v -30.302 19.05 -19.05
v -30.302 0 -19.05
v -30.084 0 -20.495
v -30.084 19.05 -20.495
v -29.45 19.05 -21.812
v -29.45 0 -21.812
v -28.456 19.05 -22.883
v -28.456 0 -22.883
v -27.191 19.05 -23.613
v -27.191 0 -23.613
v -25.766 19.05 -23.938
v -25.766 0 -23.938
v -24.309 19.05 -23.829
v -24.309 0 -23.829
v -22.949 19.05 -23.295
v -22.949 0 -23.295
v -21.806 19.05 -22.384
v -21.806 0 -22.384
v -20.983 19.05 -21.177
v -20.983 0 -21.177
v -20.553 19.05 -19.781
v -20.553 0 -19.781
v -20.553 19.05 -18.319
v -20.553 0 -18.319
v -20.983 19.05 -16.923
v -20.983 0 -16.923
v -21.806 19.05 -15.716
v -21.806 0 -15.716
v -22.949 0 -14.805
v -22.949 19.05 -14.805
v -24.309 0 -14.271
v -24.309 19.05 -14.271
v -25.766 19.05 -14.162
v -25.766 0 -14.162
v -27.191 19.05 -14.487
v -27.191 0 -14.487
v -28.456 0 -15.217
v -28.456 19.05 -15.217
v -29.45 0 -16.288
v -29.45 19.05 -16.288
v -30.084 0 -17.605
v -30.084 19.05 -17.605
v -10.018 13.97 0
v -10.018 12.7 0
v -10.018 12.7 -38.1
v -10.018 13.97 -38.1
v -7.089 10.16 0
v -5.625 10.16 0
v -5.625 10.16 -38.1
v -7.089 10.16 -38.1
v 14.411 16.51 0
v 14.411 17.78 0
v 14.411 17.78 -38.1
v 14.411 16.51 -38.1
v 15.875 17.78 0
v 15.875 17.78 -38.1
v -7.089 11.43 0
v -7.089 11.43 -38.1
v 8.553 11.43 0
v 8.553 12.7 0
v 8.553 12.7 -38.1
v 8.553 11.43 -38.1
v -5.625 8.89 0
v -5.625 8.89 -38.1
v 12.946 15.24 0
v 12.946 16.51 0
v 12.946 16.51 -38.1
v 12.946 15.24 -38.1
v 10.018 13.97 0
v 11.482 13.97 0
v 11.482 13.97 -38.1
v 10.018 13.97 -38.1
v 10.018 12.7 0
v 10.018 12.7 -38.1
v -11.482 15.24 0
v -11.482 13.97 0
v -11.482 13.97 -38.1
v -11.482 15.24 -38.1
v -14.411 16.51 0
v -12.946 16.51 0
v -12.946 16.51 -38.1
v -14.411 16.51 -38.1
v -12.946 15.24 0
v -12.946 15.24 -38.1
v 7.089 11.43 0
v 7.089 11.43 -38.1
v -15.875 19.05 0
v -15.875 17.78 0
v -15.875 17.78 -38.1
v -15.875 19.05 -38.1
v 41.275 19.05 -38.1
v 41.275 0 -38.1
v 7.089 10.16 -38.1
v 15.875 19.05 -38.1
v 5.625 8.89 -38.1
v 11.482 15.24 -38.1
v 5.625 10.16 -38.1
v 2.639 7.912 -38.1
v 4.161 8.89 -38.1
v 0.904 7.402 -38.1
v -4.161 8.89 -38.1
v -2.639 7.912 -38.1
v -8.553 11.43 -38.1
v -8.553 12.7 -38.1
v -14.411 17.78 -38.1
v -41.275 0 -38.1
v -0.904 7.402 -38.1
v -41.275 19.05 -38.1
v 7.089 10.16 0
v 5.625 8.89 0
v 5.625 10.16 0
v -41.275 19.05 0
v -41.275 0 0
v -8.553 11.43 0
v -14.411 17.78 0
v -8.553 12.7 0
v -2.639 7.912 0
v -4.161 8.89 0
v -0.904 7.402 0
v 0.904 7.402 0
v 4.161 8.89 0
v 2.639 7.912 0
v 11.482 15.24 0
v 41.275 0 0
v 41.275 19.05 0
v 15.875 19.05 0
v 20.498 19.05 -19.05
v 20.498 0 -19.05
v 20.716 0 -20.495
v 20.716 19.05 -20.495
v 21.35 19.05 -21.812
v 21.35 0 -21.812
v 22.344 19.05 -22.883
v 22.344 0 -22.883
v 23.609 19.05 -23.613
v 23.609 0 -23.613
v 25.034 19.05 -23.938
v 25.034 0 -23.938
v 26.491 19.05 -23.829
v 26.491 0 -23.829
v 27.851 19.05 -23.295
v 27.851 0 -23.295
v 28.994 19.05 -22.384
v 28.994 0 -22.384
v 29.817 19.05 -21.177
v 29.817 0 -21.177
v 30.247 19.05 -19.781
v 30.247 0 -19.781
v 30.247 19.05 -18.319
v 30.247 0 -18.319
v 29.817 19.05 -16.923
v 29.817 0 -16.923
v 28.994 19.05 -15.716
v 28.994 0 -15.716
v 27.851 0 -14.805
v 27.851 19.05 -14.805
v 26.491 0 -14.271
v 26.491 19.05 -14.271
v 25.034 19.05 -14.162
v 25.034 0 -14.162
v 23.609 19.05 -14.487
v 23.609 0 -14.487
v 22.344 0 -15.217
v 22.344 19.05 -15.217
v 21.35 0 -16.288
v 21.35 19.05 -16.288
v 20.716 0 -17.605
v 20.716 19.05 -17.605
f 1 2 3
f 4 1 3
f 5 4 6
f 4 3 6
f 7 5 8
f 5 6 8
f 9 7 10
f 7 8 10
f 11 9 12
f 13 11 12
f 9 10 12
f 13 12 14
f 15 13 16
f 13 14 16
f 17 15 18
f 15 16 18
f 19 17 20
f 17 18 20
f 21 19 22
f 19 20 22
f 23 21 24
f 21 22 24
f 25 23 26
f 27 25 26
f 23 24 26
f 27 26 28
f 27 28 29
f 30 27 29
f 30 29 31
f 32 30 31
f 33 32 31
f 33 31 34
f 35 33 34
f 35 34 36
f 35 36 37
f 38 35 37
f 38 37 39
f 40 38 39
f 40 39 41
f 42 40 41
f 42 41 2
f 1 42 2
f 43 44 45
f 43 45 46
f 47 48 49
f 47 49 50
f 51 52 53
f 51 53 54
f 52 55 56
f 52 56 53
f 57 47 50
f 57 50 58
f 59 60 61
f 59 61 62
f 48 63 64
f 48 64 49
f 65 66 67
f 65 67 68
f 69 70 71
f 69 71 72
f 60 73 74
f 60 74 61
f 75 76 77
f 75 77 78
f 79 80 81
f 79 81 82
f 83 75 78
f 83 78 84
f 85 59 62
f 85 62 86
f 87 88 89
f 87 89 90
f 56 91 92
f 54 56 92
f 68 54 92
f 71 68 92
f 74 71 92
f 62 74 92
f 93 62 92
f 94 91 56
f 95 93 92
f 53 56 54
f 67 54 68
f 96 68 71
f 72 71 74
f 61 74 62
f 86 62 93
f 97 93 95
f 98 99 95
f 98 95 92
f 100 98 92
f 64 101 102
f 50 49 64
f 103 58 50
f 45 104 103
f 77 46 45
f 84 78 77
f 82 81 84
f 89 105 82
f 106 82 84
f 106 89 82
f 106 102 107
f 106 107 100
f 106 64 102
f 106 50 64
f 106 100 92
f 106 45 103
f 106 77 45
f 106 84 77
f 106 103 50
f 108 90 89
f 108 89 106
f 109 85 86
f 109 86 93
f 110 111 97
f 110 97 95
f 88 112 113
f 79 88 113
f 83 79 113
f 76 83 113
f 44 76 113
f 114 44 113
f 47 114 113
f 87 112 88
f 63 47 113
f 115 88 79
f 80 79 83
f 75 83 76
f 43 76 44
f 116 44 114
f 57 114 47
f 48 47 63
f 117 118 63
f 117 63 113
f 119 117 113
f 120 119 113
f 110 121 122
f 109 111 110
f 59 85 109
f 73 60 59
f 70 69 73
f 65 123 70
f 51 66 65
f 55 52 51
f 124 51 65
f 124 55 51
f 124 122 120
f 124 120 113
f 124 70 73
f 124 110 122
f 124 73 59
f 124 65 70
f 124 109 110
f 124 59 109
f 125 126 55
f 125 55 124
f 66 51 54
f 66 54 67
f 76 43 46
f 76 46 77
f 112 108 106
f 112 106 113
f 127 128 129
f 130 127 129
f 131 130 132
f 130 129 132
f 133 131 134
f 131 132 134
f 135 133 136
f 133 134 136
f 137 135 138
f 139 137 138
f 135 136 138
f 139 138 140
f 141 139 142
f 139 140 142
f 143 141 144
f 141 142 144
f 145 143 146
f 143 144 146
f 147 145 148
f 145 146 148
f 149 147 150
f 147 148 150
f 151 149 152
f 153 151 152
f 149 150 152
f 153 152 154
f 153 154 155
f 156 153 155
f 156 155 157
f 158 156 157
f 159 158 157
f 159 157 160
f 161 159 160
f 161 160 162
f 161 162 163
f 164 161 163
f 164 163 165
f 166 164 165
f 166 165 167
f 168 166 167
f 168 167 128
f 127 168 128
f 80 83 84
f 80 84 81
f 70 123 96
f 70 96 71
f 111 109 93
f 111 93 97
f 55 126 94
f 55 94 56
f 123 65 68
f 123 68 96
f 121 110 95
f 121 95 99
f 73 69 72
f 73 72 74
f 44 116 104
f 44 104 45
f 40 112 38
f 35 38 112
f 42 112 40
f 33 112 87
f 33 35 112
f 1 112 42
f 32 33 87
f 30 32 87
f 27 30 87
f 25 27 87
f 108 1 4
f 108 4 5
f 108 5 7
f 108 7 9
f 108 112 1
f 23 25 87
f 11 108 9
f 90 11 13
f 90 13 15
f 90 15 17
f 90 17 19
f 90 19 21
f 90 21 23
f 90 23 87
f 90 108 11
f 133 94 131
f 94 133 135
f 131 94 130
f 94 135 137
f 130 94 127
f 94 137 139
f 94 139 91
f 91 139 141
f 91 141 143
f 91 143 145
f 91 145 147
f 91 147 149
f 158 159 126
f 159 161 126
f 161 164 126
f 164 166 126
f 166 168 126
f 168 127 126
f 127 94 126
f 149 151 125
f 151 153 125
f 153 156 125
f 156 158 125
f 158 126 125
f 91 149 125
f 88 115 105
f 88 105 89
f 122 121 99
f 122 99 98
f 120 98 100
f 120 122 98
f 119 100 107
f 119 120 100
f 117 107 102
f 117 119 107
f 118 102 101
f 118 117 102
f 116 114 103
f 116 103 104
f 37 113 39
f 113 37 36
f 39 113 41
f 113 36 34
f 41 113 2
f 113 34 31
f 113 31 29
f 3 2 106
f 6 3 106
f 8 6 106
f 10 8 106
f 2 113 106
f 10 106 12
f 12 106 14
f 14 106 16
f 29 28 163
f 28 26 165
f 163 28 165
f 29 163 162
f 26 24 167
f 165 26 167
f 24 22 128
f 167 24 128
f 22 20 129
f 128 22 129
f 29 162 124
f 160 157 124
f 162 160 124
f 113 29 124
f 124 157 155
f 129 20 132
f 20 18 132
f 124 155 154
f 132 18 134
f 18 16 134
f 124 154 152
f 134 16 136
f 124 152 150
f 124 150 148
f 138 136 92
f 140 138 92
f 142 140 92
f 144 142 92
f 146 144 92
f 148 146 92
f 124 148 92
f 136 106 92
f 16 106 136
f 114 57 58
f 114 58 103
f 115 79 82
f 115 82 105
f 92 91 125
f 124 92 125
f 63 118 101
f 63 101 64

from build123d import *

# Parameters (mm, degrees)
SKETCH1_W               = 69.85
SKETCH1_H               = 19.05
BOSS_EXTRUDE1_DEPTH     = 38.1
CUT_EXTRUDE1_REACH      = 40.1
F_3_8_CLEARANCE_HOLE1_D = 9.8044
BOSS_EXTRUDE2_DEPTH     = 19.05


with BuildPart() as part:
    # Sketch1 → Boss-Extrude1 (new body)
    with BuildSketch(Plane.XY):
        with Locations((0, 9.525)):
            Rectangle(SKETCH1_W, SKETCH1_H)
    extrude(amount=-BOSS_EXTRUDE1_DEPTH)

    # Sketch2 → Cut-Extrude1 (cut, up to next)
    with BuildSketch(Plane.XY, mode=Mode.PRIVATE) as cut_extrude1_sk1:
        with BuildLine():
            Line((-15.875, 19.05), (0, 19.05))
            Line((0, 19.05), (15.875, 19.05))
            Line((15.875, 19.05), (15.875, 17.78))
            Line((15.875, 17.78), (14.410694861, 17.78))
            Line((14.410694861, 17.78), (14.410694861, 16.51))
            Line((14.410694861, 16.51), (12.946389723, 16.51))
            Line((12.946389723, 16.51), (12.946389723, 15.24))
            Line((12.946389723, 15.24), (11.482084584, 15.24))
            Line((11.482084584, 15.24), (11.482084584, 13.97))
            Line((11.482084584, 13.97), (10.017779445, 13.97))
            Line((10.017779445, 13.97), (10.017779445, 12.7))
            Line((10.017779445, 12.7), (8.553474306, 12.7))
            Line((8.553474306, 12.7), (8.553474306, 11.43))
            Line((8.553474306, 11.43), (7.089169168, 11.43))
            Line((7.089169168, 11.43), (7.089169168, 10.16))
            Line((7.089169168, 10.16), (5.624864029, 10.16))
            Line((5.624864029, 10.16), (5.624864029, 8.89))
            Line((5.624864029, 8.89), (4.16055889, 8.89))
            ThreePointArc((4.16055889, 8.89), (0, 7.337108475), (-4.16055889, 8.89))
            Line((-4.16055889, 8.89), (-5.624864029, 8.89))
            Line((-5.624864029, 8.89), (-5.624864029, 10.16))
            Line((-5.624864029, 10.16), (-7.089169168, 10.16))
            Line((-7.089169168, 10.16), (-7.089169168, 11.43))
            Line((-7.089169168, 11.43), (-8.553474306, 11.43))
            Line((-8.553474306, 11.43), (-8.553474306, 12.7))
            Line((-8.553474306, 12.7), (-10.017779445, 12.7))
            Line((-10.017779445, 12.7), (-10.017779445, 13.97))
            Line((-10.017779445, 13.97), (-11.482084584, 13.97))
            Line((-11.482084584, 13.97), (-11.482084584, 15.24))
            Line((-11.482084584, 15.24), (-12.946389723, 15.24))
            Line((-12.946389723, 15.24), (-12.946389723, 16.51))
            Line((-12.946389723, 16.51), (-14.410694861, 16.51))
            Line((-14.410694861, 16.51), (-14.410694861, 17.78))
            Line((-14.410694861, 17.78), (-15.875, 17.78))
            Line((-15.875, 17.78), (-15.875, 19.05))
        make_face()
    cut_extrude1_tool1 = extrude(cut_extrude1_sk1.sketch, amount=-CUT_EXTRUDE1_REACH, mode=Mode.PRIVATE) & part.part
    add(cut_extrude1_tool1.solids().sort_by_distance((0, 14.620592, 0))[0], mode=Mode.SUBTRACT)

    # 3/8 Clearance Hole1 (through all)
    with Locations(Plane(origin=(0, 19.05, 0), x_dir=(1, 0, 0), z_dir=(0, 1, 0))):
        with Locations((-25.4, 19.05), (25.4, 19.05)):
            Hole(F_3_8_CLEARANCE_HOLE1_D / 2)

    # Sketch7 → Boss-Extrude2 (add)
    with BuildSketch(Plane(origin=(0, 19.05, 0), x_dir=(1, 0, 0), z_dir=(0, 1, 0))):
        Polygon((-34.925, 38.1), (-41.275, 38.1), (-41.275, 0), (-32.371593609, 0), (-32.371593609, 38.1), align=None)
        Polygon((41.275, 0), (32.371593609, 0), (32.371593609, 38.1), (34.925, 38.1), (41.275, 38.1), align=None)
    extrude(amount=-BOSS_EXTRUDE2_DEPTH)


solid = part.part
